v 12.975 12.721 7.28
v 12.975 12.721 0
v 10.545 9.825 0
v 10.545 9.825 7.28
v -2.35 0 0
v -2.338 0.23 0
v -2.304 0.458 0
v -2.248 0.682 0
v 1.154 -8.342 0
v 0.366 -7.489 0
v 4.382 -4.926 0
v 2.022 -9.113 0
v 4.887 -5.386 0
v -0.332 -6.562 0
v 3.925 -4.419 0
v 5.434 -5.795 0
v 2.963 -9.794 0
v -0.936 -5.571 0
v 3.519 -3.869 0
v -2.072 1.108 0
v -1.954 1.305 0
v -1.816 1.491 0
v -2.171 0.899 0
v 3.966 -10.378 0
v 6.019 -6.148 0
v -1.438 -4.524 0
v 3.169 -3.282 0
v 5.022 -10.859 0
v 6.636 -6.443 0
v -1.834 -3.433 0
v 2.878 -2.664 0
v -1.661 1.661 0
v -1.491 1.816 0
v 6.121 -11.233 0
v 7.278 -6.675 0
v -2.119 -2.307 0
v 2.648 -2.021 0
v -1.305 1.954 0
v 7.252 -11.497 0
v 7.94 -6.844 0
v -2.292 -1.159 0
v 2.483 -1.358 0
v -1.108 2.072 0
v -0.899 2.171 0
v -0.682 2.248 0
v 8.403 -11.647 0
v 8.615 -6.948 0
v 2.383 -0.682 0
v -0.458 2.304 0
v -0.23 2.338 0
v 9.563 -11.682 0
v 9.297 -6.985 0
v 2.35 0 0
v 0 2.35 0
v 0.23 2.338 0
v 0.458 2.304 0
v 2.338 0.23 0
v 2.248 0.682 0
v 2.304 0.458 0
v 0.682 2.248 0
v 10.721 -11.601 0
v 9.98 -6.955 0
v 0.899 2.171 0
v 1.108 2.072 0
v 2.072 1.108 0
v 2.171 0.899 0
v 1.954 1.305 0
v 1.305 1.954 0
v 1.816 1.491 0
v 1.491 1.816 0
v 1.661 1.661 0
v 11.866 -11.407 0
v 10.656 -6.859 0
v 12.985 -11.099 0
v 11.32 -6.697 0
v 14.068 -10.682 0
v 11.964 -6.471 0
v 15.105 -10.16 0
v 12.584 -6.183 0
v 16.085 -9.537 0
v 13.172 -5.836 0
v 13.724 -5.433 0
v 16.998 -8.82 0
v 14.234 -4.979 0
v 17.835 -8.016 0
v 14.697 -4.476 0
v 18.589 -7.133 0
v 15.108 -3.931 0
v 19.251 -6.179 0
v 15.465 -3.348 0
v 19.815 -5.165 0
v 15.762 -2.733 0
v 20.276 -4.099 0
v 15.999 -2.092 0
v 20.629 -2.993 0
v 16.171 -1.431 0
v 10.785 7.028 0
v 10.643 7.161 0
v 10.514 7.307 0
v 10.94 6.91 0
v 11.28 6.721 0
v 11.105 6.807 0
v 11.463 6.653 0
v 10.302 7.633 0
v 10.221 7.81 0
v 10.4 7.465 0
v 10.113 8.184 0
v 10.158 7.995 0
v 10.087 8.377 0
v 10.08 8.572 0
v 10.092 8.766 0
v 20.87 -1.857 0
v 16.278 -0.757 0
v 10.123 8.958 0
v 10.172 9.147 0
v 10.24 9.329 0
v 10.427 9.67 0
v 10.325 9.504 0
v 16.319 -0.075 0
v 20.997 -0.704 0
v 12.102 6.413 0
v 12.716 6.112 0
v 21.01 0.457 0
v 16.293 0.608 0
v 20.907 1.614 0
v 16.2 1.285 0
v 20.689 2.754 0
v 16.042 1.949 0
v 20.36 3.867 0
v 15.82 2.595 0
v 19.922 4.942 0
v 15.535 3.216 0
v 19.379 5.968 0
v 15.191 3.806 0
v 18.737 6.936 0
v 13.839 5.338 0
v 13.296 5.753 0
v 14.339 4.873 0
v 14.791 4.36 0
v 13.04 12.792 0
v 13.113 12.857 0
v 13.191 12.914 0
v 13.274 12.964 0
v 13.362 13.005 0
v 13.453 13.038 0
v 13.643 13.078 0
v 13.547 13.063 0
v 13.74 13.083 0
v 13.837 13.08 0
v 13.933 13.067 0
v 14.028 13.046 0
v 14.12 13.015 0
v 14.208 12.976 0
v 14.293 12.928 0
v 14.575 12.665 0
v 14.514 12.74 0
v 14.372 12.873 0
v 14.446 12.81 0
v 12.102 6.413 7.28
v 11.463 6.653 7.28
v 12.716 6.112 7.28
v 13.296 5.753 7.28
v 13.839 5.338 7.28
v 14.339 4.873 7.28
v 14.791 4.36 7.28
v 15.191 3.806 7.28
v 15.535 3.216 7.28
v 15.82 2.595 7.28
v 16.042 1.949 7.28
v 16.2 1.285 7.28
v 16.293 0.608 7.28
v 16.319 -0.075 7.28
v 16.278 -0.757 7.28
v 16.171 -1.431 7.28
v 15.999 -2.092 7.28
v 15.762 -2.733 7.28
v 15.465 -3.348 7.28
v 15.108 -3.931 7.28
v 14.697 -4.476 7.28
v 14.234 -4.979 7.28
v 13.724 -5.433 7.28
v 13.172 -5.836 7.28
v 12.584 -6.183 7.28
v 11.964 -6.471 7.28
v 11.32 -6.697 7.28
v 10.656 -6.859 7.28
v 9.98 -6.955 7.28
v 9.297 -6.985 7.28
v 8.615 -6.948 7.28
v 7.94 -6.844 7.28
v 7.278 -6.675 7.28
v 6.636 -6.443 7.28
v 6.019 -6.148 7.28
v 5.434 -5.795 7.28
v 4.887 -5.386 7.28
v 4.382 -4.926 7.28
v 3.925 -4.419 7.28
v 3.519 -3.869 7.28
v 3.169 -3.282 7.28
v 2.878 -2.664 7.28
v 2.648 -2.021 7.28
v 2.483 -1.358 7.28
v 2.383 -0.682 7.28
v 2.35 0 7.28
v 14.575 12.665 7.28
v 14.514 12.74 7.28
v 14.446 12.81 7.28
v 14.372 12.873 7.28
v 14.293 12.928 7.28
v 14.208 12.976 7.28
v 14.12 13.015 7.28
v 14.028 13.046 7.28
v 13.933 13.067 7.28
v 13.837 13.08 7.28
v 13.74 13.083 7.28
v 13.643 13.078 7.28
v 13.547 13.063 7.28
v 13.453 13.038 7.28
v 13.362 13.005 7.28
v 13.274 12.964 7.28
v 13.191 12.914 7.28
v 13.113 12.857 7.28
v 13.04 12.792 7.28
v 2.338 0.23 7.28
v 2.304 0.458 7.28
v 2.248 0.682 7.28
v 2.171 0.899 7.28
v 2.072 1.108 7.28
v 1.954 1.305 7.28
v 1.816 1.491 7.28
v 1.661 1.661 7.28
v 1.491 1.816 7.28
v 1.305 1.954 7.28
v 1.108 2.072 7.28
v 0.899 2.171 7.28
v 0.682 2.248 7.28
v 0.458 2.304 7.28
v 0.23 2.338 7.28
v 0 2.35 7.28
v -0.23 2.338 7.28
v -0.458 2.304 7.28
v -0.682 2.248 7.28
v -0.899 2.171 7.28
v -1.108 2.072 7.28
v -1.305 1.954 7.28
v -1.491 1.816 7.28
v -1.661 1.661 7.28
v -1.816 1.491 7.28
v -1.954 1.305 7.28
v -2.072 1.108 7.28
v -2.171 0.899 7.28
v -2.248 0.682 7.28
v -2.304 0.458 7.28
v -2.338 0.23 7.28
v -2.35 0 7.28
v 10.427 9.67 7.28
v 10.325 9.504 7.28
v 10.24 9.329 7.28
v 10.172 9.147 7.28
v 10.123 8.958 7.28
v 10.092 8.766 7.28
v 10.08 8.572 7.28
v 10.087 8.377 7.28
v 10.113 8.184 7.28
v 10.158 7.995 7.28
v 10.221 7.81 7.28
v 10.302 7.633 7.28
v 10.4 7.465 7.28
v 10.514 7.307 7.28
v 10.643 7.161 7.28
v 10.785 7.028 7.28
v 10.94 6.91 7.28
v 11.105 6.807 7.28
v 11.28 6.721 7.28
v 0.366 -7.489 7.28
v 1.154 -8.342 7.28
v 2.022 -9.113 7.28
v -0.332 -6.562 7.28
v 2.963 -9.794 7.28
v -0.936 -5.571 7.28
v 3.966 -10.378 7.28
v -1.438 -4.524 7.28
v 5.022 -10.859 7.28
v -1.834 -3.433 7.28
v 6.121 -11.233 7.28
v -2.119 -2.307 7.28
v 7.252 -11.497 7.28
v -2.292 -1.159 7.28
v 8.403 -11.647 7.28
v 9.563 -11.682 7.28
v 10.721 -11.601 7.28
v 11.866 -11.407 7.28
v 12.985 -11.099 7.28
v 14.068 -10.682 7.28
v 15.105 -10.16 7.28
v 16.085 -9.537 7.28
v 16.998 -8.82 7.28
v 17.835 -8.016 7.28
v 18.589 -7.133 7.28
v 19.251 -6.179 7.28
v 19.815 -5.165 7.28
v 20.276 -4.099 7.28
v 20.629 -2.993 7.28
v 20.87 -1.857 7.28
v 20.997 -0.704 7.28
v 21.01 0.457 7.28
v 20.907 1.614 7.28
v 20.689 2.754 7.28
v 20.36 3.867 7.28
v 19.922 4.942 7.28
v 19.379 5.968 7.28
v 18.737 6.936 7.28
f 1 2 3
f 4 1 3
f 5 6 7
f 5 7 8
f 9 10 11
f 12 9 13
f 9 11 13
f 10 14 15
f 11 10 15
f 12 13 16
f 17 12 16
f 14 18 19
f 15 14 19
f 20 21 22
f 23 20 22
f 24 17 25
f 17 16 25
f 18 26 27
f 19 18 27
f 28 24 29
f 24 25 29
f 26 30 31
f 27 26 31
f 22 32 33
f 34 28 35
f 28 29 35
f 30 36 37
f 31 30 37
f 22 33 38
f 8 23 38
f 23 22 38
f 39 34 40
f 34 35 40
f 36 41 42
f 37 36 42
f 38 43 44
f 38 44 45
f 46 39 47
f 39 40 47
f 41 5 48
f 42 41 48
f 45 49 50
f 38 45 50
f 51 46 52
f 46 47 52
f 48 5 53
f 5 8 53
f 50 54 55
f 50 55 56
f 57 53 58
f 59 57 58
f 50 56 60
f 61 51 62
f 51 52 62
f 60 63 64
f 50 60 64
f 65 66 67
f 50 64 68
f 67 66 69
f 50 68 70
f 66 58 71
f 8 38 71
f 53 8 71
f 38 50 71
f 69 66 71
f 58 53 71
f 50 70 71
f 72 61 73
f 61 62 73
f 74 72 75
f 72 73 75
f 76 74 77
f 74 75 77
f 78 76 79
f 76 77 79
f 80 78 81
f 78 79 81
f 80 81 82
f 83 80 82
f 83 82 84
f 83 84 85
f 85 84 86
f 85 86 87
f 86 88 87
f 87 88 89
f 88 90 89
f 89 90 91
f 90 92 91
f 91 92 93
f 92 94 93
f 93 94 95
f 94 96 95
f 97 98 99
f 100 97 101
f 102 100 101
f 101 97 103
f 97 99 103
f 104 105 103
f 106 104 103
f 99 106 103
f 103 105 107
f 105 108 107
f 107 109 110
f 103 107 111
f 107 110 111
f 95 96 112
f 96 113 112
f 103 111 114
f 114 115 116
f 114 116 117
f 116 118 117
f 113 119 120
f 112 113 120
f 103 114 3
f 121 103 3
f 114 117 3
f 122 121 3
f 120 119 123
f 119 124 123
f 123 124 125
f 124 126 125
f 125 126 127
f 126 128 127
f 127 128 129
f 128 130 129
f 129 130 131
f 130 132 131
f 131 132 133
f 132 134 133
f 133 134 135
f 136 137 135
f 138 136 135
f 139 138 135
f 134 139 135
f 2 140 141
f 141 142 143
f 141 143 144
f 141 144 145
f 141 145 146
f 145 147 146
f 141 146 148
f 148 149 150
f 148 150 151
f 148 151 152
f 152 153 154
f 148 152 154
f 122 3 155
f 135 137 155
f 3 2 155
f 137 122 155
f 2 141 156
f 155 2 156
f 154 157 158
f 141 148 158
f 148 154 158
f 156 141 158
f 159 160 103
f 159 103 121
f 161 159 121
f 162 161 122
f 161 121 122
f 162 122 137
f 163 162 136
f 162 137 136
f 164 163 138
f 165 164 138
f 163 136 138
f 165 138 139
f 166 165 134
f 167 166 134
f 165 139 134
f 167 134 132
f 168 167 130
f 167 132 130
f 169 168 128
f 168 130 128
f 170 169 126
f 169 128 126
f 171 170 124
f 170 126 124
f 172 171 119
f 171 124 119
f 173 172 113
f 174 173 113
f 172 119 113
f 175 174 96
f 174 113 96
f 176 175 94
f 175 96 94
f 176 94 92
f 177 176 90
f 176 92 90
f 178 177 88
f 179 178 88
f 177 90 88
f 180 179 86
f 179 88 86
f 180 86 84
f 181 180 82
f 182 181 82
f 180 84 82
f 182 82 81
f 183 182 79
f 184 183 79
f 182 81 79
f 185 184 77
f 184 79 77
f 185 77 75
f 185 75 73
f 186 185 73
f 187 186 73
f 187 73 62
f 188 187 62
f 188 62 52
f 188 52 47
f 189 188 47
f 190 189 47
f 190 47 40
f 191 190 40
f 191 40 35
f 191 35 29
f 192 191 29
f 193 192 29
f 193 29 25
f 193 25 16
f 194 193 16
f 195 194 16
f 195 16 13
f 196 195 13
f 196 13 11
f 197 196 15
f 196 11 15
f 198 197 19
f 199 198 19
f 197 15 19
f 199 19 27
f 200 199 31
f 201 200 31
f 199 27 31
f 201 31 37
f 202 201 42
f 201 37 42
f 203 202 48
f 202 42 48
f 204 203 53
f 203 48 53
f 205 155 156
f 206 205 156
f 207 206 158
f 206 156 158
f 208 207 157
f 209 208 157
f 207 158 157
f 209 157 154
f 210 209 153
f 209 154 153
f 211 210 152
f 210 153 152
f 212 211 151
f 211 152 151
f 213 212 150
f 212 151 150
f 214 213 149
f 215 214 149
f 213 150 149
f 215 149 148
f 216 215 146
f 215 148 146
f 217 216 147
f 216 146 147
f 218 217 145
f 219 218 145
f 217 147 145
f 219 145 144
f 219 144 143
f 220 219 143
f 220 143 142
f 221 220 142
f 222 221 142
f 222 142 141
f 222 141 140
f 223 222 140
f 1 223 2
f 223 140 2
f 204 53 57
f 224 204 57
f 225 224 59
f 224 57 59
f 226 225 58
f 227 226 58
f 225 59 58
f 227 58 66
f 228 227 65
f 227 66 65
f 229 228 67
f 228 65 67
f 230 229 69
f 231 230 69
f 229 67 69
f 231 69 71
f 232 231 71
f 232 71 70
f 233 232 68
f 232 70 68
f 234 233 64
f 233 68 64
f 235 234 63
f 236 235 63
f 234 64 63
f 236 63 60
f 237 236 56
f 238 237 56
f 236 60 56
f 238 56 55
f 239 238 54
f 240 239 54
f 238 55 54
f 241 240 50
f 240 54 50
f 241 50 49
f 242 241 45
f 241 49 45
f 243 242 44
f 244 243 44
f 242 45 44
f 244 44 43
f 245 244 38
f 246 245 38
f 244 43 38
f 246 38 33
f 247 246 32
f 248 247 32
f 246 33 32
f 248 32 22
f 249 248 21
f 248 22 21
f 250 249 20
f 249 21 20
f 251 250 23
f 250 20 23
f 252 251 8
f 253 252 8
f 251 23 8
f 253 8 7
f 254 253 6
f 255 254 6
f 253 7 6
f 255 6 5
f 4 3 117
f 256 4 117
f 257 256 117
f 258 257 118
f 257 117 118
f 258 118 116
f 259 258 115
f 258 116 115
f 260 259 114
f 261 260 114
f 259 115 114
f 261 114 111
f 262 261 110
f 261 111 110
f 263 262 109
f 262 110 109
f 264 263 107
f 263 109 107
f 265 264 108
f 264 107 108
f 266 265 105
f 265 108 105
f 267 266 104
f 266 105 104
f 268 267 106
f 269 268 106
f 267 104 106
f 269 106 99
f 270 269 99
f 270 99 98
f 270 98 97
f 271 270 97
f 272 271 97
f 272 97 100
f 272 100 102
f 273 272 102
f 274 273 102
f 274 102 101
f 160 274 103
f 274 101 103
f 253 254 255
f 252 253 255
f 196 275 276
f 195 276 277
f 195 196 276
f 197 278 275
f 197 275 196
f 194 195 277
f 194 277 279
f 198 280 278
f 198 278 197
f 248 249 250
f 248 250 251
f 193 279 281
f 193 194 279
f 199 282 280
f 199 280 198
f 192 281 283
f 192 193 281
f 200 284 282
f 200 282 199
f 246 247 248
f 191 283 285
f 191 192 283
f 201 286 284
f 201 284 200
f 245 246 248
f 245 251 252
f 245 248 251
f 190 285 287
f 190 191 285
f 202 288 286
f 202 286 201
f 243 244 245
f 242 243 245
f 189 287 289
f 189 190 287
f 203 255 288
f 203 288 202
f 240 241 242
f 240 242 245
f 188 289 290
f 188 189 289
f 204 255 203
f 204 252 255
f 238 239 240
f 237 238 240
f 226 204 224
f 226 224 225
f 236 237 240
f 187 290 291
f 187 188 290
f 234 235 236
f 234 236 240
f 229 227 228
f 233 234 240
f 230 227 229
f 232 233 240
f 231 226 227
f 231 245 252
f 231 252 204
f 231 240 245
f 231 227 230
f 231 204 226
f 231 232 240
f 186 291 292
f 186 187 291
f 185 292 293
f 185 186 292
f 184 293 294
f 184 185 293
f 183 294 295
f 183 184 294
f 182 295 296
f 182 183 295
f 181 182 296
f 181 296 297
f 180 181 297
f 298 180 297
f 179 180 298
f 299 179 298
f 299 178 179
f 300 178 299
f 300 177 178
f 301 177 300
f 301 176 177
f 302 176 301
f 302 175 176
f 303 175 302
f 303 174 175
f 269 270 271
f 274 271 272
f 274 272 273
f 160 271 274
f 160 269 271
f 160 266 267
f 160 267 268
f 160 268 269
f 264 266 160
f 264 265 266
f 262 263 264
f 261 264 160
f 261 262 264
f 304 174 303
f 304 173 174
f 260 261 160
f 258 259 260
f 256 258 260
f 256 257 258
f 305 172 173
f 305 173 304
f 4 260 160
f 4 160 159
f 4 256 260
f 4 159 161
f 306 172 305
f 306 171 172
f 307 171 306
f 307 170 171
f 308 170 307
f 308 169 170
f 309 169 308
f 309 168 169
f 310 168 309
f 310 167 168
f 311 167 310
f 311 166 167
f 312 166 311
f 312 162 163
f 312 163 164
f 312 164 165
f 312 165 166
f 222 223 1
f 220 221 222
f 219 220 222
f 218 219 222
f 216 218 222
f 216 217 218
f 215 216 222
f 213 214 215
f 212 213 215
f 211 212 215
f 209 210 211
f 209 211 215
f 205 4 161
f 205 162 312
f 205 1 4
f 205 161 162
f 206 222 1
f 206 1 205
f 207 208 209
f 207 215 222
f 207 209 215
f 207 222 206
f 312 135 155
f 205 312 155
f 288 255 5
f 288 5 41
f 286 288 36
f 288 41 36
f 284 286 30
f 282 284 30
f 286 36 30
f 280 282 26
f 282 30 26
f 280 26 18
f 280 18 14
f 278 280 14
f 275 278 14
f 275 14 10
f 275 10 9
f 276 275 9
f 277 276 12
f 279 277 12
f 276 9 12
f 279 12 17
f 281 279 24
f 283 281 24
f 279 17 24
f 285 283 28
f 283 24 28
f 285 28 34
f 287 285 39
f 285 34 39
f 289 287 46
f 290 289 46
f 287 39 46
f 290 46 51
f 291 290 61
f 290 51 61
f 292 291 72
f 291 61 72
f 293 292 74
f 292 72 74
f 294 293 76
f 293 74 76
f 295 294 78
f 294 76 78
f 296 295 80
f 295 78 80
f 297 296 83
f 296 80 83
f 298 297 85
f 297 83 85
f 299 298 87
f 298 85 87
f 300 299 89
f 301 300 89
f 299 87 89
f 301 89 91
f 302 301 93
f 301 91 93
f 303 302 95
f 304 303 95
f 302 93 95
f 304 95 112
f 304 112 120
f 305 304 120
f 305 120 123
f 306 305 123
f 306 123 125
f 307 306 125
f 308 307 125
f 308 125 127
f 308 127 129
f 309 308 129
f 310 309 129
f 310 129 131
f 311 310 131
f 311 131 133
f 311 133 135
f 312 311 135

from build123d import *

# Parameters (mm, degrees)
F1_DEPTH = 7.28025


with BuildPart() as f1:
    # F0 (on Top) → F1 (new body)
    with BuildSketch(Plane.XY):
        with BuildLine():
            ThreePointArc((-2.3495, 0), (12.985089, -11.099056), (18.737294, 6.935655))
            Line((18.737294, 6.935655), (14.574847, 12.664773))
            ThreePointArc((14.574847, 12.664773), (13.788343, 13.082964), (12.974584, 12.720656))
            Line((12.974584, 12.720656), (10.545117, 9.82533))
            ThreePointArc((10.545117, 9.82533), (10.158151, 7.994524), (11.462635, 6.652914))
            ThreePointArc((11.462635, 6.652914), (13.453068, -5.641598), (2.3495, 0))
            ThreePointArc((2.3495, 0), (0, 2.3495), (-2.3495, 0))
        make_face()
    extrude(amount=F1_DEPTH)


solid = f1.part
